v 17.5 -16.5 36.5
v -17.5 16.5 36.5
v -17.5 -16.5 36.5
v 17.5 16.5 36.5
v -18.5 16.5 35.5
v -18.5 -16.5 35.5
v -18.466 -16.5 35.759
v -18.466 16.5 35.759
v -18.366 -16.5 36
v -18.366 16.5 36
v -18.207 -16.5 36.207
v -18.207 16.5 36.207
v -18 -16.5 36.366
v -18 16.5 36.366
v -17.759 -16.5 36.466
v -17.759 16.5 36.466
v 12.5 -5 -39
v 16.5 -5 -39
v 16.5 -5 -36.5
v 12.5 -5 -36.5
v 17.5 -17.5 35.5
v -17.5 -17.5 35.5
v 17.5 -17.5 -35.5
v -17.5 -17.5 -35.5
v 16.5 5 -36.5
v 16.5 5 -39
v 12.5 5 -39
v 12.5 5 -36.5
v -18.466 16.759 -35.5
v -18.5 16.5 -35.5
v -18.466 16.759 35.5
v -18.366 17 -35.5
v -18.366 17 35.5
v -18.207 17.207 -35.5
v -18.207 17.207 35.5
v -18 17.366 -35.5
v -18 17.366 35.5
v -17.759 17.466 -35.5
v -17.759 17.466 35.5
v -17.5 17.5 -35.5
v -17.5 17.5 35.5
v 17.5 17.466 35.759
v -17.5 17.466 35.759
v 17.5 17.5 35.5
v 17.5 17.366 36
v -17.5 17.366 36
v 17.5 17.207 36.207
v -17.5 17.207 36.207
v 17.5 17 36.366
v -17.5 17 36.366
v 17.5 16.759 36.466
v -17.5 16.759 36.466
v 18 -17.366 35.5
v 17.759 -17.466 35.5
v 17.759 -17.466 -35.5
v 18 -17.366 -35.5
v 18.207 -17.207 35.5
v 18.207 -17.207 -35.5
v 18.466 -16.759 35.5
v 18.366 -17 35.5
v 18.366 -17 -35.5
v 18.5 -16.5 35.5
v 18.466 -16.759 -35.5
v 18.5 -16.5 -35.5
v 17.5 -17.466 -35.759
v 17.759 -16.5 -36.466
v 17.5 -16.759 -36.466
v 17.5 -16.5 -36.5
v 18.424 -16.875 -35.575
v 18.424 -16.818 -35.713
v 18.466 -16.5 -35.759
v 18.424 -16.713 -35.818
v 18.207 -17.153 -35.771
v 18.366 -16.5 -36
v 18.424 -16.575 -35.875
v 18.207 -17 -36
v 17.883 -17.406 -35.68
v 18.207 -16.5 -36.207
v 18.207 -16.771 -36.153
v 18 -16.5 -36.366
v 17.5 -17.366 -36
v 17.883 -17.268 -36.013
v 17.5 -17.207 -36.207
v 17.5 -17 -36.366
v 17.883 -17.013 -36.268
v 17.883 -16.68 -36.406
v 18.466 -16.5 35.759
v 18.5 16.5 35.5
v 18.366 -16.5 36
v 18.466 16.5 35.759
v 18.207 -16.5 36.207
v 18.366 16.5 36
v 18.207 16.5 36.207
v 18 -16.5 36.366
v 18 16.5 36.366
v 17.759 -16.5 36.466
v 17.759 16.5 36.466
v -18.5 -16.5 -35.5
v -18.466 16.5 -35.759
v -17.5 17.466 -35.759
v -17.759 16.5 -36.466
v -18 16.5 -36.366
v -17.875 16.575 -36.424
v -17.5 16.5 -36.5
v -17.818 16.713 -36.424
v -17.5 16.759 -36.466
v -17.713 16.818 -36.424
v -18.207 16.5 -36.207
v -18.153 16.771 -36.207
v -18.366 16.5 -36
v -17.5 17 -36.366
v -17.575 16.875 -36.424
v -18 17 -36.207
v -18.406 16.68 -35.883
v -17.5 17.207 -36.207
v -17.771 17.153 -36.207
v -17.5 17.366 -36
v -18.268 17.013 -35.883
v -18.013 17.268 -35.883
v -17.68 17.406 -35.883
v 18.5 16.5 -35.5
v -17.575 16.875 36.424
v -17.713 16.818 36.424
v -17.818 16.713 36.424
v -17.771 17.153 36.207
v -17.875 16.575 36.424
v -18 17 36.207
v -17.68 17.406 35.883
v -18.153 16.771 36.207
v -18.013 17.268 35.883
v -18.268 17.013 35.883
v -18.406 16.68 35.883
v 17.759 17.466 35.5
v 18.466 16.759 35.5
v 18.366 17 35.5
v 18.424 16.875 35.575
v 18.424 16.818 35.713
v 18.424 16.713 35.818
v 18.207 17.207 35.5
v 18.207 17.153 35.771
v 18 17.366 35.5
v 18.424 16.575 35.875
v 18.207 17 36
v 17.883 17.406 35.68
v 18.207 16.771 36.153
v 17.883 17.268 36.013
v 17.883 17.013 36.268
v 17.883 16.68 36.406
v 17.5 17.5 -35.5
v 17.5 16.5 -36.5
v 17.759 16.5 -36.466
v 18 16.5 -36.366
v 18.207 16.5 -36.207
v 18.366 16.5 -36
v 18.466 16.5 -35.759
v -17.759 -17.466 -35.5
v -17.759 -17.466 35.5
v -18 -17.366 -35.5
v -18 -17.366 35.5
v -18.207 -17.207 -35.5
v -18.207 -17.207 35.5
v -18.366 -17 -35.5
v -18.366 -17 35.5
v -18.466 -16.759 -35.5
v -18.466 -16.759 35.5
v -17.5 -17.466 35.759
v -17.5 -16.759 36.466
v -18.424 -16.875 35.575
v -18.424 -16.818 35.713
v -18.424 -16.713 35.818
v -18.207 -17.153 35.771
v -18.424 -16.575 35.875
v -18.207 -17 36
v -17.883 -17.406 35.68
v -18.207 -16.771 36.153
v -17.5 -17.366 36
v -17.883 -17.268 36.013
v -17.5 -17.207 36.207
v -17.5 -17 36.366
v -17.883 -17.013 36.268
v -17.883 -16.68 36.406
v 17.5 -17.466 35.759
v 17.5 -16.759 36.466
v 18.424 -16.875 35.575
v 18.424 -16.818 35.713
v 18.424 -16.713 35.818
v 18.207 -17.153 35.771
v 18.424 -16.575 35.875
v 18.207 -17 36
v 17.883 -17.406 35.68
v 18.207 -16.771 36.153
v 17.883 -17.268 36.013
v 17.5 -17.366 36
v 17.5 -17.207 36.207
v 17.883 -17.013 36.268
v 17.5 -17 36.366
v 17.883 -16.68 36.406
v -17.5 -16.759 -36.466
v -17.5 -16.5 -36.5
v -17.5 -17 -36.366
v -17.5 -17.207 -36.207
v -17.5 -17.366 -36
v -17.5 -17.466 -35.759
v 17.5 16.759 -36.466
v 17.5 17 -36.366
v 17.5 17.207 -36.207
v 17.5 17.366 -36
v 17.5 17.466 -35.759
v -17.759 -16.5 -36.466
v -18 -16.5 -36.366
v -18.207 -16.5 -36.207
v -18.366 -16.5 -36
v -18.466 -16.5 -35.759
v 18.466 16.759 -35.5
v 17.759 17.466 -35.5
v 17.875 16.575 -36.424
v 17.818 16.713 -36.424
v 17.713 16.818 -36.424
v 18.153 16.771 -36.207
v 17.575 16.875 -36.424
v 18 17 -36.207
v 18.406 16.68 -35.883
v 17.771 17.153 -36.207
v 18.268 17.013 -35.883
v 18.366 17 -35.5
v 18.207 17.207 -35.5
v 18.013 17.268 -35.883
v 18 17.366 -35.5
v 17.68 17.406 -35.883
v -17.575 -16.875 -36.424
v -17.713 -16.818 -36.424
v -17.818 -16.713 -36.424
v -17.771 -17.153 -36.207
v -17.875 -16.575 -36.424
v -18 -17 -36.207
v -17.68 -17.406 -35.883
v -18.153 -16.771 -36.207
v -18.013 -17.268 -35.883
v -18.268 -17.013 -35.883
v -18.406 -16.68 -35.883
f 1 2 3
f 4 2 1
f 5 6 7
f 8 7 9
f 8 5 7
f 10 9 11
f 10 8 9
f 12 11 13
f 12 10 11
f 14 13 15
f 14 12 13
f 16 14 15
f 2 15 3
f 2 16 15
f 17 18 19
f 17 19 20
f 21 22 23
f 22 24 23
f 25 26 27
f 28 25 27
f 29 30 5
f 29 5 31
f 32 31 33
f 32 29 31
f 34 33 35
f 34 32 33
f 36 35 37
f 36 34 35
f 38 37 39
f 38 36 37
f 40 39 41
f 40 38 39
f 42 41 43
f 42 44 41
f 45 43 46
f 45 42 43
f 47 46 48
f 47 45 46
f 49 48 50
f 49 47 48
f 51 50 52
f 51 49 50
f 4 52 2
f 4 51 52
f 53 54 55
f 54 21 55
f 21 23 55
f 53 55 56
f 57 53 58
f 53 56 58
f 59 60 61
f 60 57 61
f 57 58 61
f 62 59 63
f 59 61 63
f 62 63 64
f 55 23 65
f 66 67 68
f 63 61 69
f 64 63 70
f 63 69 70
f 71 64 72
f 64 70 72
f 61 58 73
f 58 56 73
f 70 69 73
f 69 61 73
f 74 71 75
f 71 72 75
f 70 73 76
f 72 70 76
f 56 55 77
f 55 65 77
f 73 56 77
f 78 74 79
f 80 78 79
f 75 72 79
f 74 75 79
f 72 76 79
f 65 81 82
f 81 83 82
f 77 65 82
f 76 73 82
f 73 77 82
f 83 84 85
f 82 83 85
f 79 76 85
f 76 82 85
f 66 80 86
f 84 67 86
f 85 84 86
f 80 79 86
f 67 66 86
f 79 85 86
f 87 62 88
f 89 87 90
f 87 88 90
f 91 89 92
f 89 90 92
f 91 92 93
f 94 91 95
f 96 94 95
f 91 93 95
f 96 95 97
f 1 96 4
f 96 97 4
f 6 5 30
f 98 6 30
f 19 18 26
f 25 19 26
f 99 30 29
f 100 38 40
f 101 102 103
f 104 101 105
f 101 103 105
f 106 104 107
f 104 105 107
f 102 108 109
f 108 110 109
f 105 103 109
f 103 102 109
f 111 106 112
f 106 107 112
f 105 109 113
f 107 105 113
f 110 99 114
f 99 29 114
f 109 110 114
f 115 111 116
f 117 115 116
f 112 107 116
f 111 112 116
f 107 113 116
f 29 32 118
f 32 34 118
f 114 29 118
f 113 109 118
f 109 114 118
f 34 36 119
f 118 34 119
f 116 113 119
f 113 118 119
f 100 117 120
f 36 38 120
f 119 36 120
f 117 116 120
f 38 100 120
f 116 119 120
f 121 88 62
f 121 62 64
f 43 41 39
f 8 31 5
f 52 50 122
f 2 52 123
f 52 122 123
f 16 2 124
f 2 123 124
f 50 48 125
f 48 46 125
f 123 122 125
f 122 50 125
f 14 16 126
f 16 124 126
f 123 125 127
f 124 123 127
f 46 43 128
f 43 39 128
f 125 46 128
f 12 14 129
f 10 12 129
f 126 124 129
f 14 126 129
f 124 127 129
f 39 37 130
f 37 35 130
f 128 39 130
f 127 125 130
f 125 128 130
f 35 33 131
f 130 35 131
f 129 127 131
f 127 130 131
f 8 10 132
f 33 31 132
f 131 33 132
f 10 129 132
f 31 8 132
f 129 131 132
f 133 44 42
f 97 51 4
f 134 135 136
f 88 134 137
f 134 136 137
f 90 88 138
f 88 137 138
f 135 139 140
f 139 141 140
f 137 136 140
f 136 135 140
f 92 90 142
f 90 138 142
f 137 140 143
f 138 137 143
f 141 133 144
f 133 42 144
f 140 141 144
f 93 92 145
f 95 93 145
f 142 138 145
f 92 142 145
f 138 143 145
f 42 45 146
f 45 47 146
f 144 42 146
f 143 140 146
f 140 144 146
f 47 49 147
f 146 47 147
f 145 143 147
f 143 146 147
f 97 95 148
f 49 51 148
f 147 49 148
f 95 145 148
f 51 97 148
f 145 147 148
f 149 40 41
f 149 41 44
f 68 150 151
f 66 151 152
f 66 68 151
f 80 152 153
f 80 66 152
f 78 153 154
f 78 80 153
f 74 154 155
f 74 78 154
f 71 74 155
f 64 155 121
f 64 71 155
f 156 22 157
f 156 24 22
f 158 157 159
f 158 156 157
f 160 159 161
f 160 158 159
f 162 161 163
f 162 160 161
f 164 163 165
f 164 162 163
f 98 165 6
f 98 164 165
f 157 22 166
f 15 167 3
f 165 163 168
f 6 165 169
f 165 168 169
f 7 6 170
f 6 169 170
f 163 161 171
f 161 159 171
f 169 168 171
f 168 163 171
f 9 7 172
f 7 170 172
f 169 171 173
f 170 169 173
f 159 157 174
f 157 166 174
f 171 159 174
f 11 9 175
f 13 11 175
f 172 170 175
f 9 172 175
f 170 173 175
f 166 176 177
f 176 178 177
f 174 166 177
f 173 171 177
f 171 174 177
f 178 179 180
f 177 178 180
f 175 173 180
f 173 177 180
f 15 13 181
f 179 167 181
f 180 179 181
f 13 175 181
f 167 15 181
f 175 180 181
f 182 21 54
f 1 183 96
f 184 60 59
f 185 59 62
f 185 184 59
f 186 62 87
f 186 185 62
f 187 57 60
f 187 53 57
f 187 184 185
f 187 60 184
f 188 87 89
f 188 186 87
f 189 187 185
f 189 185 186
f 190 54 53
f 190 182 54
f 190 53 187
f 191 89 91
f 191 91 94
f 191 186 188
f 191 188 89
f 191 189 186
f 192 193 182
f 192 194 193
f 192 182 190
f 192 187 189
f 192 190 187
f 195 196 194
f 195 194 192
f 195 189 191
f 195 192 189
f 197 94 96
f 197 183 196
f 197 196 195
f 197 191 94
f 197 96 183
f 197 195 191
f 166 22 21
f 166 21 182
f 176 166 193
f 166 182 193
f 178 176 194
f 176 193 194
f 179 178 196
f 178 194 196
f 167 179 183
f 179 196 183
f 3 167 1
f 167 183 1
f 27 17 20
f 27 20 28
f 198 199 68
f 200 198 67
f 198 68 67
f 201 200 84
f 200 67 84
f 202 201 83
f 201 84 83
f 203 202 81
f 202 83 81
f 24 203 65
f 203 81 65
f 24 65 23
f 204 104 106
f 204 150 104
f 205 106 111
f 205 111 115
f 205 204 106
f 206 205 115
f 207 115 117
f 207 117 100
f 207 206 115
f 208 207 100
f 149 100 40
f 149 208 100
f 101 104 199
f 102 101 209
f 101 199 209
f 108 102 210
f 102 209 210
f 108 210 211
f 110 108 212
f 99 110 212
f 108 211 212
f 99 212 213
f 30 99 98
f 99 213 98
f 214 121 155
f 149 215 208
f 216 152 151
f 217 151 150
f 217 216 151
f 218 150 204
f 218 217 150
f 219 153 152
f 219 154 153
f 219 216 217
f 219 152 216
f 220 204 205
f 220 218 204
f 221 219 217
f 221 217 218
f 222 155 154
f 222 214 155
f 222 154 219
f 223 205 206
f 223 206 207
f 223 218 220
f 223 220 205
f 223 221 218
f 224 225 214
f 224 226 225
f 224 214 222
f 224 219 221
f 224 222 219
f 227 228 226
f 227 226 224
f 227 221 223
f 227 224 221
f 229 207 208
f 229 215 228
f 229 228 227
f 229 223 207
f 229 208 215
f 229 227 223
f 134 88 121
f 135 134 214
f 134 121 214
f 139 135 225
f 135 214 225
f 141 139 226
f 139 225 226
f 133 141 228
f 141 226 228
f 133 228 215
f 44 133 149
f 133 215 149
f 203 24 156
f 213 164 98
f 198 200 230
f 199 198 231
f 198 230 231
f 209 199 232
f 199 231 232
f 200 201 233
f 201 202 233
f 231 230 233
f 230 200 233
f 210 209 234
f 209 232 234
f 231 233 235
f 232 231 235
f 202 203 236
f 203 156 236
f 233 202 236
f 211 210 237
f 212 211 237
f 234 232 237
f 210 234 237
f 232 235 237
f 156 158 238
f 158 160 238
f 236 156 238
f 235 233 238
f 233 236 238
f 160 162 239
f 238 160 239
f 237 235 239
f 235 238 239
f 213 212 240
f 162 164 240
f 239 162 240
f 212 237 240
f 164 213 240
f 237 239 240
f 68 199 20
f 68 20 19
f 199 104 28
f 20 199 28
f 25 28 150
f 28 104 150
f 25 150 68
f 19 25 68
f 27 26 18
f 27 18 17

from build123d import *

# Parameters (mm, degrees)
SKETCH1_W           = 37
SKETCH1_H           = 73
BOSS_EXTRUDE1_DEPTH = 17.5
SKETCH2_W           = 4
SKETCH2_H           = 10
BOSS_EXTRUDE2_DEPTH = 2.5
FILLET1_R           = 1


with BuildPart() as part:
    # Sketch1 → Boss-Extrude1 (new body, symmetric)
    with BuildSketch(Plane(origin=(0, 0, 0), x_dir=(1, 0, 0), z_dir=(0, 1, 0))):
        Rectangle(SKETCH1_W, SKETCH1_H)
    extrude(amount=BOSS_EXTRUDE1_DEPTH, both=True)

    # Sketch2 → Boss-Extrude2 (add, symmetric)
    with BuildSketch(Plane(origin=(0, 0, -36.5), x_dir=(-1, 0, 0), z_dir=(0, 0, -1))):
        with Locations((-14.5, 0)):
            Rectangle(SKETCH2_W, SKETCH2_H)
    extrude(amount=BOSS_EXTRUDE2_DEPTH, both=True)

    # Fillet1
    fillet1_edges = [part.edges().sort_by_distance(p)[0] for p in [
        (-18.5, 17.5, 0),
        (0, 17.5, 36.5),
        (18.5, 17.5, 0),
        (0, -17.5, 36.5),
        (-18.5, -17.5, 0),
        (0, -17.5, -36.5),
        (18.5, -17.5, 0),
        (18.5, 0, 36.5),
        (-18.5, 0, 36.5),
        (-18.5, 0, -36.5),
        (18.5, 0, -36.5),
        (0, 17.5, -36.5),
    ]]
    fillet(fillet1_edges, radius=FILLET1_R)


solid = part.part
